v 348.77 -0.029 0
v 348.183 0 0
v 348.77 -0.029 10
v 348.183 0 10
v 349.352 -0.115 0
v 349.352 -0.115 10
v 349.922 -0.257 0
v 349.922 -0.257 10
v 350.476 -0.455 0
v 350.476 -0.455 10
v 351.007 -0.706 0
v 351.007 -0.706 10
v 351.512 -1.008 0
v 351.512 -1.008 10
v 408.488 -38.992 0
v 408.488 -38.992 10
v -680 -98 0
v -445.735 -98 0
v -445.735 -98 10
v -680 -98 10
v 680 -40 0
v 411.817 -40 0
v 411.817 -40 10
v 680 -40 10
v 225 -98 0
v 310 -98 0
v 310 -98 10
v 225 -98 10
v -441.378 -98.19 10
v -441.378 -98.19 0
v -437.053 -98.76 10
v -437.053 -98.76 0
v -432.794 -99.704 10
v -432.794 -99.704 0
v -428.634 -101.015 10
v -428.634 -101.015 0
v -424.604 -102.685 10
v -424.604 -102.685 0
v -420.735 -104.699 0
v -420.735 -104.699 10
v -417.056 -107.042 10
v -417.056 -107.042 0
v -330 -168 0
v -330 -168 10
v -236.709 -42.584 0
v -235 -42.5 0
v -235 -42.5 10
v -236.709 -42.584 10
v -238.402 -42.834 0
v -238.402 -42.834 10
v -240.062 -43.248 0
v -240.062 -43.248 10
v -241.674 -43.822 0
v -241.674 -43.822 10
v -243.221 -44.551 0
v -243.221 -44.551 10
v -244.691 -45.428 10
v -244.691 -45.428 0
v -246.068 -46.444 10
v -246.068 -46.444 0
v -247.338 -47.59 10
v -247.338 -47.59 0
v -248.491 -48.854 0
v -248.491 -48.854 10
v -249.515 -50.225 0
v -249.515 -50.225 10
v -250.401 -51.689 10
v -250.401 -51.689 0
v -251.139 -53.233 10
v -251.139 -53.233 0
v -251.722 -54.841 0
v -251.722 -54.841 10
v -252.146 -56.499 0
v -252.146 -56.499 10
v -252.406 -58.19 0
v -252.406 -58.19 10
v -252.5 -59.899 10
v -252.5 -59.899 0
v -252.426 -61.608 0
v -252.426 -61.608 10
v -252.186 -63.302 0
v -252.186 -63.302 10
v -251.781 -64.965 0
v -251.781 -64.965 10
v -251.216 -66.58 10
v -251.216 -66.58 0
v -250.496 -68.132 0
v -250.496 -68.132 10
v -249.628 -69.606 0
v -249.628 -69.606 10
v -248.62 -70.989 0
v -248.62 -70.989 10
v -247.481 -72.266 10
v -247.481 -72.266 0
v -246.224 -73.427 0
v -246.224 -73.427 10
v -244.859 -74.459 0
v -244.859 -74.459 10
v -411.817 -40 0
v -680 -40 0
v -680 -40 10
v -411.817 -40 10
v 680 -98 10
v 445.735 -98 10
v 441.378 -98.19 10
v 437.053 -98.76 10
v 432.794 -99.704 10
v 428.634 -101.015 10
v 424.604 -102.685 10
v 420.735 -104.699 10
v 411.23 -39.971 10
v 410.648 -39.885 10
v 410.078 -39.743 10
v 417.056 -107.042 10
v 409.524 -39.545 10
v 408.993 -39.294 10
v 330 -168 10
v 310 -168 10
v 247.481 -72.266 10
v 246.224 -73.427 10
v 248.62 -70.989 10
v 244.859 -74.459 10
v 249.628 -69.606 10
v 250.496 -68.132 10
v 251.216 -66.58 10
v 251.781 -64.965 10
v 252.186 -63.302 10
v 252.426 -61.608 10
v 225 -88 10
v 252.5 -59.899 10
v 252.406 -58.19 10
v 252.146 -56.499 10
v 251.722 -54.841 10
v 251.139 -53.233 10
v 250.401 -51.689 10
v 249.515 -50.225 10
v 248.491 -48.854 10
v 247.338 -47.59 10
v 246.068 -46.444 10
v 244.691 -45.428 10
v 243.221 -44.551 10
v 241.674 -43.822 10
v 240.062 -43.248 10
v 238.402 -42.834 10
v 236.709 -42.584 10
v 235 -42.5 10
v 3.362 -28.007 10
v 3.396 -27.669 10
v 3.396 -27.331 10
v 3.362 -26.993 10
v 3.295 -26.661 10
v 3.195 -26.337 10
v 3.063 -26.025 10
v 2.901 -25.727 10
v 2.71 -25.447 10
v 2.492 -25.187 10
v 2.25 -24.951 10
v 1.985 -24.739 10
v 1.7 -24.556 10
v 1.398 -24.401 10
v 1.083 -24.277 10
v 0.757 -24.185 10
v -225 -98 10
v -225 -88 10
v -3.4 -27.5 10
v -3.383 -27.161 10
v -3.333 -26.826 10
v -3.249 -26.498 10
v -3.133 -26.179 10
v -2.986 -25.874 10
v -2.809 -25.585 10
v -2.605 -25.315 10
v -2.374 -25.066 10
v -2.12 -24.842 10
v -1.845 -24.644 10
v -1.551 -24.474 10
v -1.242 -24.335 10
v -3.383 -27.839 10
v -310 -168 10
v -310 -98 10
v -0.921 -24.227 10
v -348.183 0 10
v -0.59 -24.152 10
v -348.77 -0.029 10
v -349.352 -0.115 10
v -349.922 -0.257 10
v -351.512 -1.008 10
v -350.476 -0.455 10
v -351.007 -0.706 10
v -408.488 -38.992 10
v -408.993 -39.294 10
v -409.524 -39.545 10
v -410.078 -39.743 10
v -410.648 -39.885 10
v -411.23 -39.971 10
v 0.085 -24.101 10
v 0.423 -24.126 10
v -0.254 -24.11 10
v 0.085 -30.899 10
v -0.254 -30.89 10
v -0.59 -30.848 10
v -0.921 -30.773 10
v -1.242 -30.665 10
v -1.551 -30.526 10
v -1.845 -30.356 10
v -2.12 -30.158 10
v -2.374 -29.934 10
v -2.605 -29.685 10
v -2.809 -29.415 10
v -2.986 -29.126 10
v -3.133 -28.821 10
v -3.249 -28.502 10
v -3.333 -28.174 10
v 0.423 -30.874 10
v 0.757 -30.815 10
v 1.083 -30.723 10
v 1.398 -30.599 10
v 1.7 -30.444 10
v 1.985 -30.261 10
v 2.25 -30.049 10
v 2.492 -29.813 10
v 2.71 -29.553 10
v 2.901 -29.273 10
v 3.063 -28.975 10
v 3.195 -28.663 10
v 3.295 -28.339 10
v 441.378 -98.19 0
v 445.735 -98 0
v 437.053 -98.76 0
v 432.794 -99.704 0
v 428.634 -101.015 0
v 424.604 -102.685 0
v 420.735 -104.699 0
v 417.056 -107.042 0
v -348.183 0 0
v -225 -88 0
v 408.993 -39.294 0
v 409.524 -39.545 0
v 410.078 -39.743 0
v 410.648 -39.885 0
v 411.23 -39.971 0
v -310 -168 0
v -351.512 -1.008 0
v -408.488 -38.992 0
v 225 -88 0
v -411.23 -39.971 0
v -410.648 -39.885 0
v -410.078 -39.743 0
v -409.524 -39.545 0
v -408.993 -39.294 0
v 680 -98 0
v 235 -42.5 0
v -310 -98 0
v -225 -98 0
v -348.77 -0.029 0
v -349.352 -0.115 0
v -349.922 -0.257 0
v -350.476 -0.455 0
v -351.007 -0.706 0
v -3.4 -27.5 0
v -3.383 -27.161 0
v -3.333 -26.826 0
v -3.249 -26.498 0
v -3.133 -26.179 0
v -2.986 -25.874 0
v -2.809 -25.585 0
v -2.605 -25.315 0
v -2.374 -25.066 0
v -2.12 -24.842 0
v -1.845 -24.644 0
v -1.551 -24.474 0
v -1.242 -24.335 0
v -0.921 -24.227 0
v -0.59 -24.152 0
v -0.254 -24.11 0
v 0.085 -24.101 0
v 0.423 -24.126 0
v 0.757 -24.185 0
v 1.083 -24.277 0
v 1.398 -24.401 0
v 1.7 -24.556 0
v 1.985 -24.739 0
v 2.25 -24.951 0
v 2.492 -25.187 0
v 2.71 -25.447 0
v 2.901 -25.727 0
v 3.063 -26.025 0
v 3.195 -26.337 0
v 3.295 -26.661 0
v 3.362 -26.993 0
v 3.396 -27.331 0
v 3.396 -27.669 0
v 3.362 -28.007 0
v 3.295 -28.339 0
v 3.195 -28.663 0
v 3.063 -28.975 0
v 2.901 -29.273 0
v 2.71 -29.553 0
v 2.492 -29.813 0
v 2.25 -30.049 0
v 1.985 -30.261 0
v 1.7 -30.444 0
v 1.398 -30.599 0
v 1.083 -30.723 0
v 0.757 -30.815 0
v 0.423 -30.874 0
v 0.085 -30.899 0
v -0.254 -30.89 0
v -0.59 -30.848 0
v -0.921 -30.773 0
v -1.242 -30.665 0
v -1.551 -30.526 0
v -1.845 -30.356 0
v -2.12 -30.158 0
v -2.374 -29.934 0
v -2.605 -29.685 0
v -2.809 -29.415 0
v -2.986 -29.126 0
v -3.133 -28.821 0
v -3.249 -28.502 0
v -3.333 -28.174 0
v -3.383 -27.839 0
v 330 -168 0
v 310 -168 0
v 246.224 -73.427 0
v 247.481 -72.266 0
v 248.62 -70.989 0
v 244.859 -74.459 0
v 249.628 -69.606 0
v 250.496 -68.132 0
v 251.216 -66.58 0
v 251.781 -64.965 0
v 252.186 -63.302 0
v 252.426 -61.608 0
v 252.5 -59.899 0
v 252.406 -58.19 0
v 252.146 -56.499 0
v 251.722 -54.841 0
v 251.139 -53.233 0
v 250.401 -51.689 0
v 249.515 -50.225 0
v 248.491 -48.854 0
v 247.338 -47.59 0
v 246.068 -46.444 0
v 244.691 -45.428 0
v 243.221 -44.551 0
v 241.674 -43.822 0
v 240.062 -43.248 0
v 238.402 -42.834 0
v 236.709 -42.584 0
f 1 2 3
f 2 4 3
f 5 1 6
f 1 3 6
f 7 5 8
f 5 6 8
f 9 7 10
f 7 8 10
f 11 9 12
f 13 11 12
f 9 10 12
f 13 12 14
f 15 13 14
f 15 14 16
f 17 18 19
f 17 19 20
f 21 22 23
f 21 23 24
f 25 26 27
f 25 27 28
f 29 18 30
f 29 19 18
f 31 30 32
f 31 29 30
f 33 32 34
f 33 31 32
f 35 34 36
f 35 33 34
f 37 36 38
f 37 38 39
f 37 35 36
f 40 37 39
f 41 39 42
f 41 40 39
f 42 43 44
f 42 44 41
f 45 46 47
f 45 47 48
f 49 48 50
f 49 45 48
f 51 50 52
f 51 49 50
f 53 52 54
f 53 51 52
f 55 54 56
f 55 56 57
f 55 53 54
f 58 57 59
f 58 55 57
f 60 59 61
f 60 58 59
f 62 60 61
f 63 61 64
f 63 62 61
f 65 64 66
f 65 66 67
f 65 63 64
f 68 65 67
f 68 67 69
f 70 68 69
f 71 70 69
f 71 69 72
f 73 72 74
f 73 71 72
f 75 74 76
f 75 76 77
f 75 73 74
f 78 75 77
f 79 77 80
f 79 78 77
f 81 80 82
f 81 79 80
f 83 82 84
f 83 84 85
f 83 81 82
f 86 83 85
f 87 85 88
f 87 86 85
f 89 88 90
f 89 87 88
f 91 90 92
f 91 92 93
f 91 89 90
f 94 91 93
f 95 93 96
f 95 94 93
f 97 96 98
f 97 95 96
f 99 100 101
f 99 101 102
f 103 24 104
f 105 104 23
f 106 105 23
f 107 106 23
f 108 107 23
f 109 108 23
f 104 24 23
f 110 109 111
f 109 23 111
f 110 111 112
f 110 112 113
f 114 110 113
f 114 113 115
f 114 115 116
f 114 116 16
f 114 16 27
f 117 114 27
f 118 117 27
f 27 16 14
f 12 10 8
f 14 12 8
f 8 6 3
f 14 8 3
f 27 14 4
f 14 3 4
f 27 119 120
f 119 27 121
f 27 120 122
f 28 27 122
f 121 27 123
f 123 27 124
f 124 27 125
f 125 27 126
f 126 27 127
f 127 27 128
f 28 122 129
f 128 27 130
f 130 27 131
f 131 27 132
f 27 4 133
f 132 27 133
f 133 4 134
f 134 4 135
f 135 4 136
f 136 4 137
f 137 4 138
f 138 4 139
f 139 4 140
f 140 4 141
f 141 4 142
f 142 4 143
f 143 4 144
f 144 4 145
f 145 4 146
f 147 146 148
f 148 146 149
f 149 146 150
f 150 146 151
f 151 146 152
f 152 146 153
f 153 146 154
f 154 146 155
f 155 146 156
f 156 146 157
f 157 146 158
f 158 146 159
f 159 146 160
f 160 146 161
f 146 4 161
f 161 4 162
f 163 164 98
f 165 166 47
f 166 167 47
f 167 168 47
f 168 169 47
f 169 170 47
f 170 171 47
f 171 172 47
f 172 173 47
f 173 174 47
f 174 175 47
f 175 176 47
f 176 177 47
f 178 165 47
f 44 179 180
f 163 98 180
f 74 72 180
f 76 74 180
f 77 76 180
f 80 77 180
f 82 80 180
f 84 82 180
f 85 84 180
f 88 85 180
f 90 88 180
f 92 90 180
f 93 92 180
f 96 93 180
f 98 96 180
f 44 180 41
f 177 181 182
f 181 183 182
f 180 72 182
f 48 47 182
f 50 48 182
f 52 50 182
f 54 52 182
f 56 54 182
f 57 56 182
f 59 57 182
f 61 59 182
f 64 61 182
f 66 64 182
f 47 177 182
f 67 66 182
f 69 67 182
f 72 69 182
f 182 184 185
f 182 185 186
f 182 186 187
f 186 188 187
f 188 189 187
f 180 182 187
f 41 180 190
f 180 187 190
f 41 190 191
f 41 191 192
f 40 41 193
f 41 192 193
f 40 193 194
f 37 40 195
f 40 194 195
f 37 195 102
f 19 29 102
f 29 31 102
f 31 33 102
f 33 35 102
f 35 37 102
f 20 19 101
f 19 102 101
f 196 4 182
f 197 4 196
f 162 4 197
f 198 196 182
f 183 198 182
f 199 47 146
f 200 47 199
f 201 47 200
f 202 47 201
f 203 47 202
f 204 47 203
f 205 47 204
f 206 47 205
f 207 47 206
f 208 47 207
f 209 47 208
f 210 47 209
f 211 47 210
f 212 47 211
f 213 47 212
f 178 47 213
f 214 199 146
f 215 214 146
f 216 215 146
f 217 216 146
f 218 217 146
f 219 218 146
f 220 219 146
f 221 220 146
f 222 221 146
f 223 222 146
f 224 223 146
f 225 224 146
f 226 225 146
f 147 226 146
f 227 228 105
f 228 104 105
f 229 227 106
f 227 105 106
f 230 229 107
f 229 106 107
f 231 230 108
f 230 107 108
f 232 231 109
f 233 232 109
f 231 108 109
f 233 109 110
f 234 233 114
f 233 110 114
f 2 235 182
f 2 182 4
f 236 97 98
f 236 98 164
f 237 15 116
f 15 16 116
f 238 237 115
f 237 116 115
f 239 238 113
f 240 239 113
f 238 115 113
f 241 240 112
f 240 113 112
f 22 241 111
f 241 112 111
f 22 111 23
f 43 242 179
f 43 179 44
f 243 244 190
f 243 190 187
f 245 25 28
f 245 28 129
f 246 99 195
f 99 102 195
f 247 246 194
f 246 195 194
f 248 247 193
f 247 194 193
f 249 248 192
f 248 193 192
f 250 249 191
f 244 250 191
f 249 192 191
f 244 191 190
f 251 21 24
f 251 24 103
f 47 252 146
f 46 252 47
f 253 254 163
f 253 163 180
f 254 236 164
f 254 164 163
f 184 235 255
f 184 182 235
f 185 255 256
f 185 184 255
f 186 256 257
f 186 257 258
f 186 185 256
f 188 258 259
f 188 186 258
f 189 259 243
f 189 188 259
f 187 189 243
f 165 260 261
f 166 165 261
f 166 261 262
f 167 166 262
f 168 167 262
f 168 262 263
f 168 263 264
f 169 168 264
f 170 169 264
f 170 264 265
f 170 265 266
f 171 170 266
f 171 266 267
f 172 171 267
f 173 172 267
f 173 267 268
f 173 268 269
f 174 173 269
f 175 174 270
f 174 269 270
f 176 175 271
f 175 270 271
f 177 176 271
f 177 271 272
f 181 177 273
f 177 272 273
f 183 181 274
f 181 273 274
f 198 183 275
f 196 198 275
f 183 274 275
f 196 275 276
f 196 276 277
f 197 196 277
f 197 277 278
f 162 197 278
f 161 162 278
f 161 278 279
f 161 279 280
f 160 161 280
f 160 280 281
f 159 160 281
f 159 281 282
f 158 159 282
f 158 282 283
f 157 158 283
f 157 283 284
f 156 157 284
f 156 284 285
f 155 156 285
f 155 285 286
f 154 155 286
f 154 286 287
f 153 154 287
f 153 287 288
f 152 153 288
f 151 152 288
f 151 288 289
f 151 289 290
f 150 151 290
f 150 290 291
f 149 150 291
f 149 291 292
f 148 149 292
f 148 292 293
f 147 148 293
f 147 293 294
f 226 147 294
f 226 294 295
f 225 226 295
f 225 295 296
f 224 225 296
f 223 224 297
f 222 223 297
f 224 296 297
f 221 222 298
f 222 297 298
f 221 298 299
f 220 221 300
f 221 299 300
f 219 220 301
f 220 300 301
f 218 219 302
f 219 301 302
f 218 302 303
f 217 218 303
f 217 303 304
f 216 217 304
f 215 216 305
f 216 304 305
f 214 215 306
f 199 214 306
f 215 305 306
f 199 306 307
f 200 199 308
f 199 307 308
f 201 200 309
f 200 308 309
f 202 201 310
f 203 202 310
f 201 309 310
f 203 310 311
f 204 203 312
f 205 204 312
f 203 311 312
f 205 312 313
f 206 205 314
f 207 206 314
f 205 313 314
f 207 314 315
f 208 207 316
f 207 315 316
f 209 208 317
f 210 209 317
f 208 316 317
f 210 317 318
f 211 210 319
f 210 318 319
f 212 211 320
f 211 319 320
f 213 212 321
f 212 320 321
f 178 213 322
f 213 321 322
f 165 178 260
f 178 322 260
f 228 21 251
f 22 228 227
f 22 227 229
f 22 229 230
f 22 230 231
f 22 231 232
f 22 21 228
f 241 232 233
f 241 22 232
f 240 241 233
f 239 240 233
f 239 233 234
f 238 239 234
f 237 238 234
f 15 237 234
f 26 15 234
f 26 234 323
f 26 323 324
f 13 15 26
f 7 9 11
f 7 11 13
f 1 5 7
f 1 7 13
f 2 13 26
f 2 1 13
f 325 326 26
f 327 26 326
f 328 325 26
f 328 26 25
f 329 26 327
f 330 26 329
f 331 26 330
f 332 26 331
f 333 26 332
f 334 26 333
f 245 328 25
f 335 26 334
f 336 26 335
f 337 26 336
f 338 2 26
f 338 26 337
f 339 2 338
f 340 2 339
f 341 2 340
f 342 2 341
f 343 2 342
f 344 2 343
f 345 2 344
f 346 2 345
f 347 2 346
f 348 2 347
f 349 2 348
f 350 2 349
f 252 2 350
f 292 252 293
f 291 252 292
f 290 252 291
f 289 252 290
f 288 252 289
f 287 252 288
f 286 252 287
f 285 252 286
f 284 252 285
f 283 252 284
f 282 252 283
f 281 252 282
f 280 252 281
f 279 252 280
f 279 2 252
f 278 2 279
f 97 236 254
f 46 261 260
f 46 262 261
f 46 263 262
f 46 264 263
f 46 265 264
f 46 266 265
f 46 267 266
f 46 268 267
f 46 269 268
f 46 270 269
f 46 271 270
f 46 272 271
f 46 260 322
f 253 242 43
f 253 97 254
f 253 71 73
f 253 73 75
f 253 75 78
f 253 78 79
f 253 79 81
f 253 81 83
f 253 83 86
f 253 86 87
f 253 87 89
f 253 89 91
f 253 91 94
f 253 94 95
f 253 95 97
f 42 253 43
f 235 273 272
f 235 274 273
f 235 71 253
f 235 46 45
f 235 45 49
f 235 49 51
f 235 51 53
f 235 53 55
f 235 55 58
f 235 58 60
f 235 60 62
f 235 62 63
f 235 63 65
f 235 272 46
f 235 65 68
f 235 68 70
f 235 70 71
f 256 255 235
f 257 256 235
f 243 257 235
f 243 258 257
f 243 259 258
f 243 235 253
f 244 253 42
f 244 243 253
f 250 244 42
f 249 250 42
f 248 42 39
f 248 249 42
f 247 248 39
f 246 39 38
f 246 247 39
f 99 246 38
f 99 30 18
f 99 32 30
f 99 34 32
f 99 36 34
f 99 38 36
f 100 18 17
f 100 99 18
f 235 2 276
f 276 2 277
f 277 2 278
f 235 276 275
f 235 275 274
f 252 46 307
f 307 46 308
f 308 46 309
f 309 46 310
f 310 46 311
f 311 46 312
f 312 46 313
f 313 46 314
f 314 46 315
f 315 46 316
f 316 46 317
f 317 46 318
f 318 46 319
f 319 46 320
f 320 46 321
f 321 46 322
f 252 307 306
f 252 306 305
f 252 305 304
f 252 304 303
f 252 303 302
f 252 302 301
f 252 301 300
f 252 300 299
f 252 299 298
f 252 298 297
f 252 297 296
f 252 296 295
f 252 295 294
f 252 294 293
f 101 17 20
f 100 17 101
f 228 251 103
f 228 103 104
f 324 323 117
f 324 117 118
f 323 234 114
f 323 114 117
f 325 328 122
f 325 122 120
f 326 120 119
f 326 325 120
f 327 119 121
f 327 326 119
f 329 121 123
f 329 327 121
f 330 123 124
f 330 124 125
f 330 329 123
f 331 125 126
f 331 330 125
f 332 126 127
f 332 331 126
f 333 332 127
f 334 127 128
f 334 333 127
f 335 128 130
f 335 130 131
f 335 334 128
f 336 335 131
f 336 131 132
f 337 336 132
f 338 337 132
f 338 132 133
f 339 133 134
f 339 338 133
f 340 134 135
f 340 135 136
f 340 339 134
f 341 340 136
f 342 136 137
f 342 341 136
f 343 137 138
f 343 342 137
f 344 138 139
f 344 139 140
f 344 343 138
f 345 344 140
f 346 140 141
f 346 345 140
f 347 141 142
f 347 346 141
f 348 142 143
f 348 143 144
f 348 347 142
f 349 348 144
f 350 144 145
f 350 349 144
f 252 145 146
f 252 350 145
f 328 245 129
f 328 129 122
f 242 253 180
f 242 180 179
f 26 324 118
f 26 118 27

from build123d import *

# Parameters (mm, degrees)
EXTRUDE_1_DEPTH        = 10
FILLET_1_R             = 6
HOLE_WIZARD_M8_1_D     = 6.8
HOLE_WIZARD_M8_1_DEPTH = 19.75
HOLE_WIZARD_M8_1_TIP   = 2.042926105
FILLET_2_R             = 50


with BuildPart() as part:
    # 草图1 → 凸台-拉伸1 (new body)
    with BuildSketch(Plane.XY):
        with BuildLine():
            Line((-350, 0), (350, 0))
            Line((350, 0), (410, -40))
            Line((410, -40), (680, -40))
            Line((680, -40), (680, -98))
            Line((680, -98), (429.970360472, -98))
            Line((429.970360472, -98), (330, -168))
            Line((330, -168), (310, -168))
            Line((310, -168), (310, -98))
            Line((310, -98), (225, -98))
            Line((225, -98), (225, -88))
            Line((225, -88), (244.858994383, -74.458569423))
            ThreePointArc((244.858994383, -74.458569423), (251.722364739, -54.841267835), (235, -42.5))
            Line((235, -42.5), (-235, -42.5))
            ThreePointArc((-235, -42.5), (-251.722364739, -54.841267835), (-244.858994383, -74.458569423))
            Line((-244.858994383, -74.458569423), (-225, -88))
            Line((-225, -88), (-225, -98))
            Line((-225, -98), (-310, -98))
            Line((-310, -98), (-310, -168))
            Line((-310, -168), (-330, -168))
            Line((-330, -168), (-429.970360472, -98))
            Line((-429.970360472, -98), (-680, -98))
            Line((-680, -98), (-680, -40))
            Line((-680, -40), (-410, -40))
            Line((-410, -40), (-350, 0))
        make_face()
    extrude(amount=EXTRUDE_1_DEPTH)

    # 圆角1
    fillet_1_edges = [part.edges().sort_by_distance(p)[0] for p in [
        (-350, 0, 5),
        (350, 0, 5),
        (410, -40, 5),
        (-410, -40, 5),
    ]]
    fillet(fillet_1_edges, radius=FILLET_1_R)

    # M8 螺纹孔1
    with Locations(Plane.XY.offset(10)):
        with Locations((0, -27.5)):
            Hole(HOLE_WIZARD_M8_1_D / 2, depth=HOLE_WIZARD_M8_1_DEPTH)
            with Locations((0, 0, -(HOLE_WIZARD_M8_1_DEPTH + HOLE_WIZARD_M8_1_TIP / 2))):  # 118° drill point
                Cone(0, HOLE_WIZARD_M8_1_D / 2, HOLE_WIZARD_M8_1_TIP, mode=Mode.SUBTRACT)

    # 圆角2
    fillet_2_edges = [part.edges().sort_by_distance(p)[0] for p in [
        (429.970360472, -98, 5),
        (-429.970360472, -98, 5),
    ]]
    fillet(fillet_2_edges, radius=FILLET_2_R)


solid = part.part
